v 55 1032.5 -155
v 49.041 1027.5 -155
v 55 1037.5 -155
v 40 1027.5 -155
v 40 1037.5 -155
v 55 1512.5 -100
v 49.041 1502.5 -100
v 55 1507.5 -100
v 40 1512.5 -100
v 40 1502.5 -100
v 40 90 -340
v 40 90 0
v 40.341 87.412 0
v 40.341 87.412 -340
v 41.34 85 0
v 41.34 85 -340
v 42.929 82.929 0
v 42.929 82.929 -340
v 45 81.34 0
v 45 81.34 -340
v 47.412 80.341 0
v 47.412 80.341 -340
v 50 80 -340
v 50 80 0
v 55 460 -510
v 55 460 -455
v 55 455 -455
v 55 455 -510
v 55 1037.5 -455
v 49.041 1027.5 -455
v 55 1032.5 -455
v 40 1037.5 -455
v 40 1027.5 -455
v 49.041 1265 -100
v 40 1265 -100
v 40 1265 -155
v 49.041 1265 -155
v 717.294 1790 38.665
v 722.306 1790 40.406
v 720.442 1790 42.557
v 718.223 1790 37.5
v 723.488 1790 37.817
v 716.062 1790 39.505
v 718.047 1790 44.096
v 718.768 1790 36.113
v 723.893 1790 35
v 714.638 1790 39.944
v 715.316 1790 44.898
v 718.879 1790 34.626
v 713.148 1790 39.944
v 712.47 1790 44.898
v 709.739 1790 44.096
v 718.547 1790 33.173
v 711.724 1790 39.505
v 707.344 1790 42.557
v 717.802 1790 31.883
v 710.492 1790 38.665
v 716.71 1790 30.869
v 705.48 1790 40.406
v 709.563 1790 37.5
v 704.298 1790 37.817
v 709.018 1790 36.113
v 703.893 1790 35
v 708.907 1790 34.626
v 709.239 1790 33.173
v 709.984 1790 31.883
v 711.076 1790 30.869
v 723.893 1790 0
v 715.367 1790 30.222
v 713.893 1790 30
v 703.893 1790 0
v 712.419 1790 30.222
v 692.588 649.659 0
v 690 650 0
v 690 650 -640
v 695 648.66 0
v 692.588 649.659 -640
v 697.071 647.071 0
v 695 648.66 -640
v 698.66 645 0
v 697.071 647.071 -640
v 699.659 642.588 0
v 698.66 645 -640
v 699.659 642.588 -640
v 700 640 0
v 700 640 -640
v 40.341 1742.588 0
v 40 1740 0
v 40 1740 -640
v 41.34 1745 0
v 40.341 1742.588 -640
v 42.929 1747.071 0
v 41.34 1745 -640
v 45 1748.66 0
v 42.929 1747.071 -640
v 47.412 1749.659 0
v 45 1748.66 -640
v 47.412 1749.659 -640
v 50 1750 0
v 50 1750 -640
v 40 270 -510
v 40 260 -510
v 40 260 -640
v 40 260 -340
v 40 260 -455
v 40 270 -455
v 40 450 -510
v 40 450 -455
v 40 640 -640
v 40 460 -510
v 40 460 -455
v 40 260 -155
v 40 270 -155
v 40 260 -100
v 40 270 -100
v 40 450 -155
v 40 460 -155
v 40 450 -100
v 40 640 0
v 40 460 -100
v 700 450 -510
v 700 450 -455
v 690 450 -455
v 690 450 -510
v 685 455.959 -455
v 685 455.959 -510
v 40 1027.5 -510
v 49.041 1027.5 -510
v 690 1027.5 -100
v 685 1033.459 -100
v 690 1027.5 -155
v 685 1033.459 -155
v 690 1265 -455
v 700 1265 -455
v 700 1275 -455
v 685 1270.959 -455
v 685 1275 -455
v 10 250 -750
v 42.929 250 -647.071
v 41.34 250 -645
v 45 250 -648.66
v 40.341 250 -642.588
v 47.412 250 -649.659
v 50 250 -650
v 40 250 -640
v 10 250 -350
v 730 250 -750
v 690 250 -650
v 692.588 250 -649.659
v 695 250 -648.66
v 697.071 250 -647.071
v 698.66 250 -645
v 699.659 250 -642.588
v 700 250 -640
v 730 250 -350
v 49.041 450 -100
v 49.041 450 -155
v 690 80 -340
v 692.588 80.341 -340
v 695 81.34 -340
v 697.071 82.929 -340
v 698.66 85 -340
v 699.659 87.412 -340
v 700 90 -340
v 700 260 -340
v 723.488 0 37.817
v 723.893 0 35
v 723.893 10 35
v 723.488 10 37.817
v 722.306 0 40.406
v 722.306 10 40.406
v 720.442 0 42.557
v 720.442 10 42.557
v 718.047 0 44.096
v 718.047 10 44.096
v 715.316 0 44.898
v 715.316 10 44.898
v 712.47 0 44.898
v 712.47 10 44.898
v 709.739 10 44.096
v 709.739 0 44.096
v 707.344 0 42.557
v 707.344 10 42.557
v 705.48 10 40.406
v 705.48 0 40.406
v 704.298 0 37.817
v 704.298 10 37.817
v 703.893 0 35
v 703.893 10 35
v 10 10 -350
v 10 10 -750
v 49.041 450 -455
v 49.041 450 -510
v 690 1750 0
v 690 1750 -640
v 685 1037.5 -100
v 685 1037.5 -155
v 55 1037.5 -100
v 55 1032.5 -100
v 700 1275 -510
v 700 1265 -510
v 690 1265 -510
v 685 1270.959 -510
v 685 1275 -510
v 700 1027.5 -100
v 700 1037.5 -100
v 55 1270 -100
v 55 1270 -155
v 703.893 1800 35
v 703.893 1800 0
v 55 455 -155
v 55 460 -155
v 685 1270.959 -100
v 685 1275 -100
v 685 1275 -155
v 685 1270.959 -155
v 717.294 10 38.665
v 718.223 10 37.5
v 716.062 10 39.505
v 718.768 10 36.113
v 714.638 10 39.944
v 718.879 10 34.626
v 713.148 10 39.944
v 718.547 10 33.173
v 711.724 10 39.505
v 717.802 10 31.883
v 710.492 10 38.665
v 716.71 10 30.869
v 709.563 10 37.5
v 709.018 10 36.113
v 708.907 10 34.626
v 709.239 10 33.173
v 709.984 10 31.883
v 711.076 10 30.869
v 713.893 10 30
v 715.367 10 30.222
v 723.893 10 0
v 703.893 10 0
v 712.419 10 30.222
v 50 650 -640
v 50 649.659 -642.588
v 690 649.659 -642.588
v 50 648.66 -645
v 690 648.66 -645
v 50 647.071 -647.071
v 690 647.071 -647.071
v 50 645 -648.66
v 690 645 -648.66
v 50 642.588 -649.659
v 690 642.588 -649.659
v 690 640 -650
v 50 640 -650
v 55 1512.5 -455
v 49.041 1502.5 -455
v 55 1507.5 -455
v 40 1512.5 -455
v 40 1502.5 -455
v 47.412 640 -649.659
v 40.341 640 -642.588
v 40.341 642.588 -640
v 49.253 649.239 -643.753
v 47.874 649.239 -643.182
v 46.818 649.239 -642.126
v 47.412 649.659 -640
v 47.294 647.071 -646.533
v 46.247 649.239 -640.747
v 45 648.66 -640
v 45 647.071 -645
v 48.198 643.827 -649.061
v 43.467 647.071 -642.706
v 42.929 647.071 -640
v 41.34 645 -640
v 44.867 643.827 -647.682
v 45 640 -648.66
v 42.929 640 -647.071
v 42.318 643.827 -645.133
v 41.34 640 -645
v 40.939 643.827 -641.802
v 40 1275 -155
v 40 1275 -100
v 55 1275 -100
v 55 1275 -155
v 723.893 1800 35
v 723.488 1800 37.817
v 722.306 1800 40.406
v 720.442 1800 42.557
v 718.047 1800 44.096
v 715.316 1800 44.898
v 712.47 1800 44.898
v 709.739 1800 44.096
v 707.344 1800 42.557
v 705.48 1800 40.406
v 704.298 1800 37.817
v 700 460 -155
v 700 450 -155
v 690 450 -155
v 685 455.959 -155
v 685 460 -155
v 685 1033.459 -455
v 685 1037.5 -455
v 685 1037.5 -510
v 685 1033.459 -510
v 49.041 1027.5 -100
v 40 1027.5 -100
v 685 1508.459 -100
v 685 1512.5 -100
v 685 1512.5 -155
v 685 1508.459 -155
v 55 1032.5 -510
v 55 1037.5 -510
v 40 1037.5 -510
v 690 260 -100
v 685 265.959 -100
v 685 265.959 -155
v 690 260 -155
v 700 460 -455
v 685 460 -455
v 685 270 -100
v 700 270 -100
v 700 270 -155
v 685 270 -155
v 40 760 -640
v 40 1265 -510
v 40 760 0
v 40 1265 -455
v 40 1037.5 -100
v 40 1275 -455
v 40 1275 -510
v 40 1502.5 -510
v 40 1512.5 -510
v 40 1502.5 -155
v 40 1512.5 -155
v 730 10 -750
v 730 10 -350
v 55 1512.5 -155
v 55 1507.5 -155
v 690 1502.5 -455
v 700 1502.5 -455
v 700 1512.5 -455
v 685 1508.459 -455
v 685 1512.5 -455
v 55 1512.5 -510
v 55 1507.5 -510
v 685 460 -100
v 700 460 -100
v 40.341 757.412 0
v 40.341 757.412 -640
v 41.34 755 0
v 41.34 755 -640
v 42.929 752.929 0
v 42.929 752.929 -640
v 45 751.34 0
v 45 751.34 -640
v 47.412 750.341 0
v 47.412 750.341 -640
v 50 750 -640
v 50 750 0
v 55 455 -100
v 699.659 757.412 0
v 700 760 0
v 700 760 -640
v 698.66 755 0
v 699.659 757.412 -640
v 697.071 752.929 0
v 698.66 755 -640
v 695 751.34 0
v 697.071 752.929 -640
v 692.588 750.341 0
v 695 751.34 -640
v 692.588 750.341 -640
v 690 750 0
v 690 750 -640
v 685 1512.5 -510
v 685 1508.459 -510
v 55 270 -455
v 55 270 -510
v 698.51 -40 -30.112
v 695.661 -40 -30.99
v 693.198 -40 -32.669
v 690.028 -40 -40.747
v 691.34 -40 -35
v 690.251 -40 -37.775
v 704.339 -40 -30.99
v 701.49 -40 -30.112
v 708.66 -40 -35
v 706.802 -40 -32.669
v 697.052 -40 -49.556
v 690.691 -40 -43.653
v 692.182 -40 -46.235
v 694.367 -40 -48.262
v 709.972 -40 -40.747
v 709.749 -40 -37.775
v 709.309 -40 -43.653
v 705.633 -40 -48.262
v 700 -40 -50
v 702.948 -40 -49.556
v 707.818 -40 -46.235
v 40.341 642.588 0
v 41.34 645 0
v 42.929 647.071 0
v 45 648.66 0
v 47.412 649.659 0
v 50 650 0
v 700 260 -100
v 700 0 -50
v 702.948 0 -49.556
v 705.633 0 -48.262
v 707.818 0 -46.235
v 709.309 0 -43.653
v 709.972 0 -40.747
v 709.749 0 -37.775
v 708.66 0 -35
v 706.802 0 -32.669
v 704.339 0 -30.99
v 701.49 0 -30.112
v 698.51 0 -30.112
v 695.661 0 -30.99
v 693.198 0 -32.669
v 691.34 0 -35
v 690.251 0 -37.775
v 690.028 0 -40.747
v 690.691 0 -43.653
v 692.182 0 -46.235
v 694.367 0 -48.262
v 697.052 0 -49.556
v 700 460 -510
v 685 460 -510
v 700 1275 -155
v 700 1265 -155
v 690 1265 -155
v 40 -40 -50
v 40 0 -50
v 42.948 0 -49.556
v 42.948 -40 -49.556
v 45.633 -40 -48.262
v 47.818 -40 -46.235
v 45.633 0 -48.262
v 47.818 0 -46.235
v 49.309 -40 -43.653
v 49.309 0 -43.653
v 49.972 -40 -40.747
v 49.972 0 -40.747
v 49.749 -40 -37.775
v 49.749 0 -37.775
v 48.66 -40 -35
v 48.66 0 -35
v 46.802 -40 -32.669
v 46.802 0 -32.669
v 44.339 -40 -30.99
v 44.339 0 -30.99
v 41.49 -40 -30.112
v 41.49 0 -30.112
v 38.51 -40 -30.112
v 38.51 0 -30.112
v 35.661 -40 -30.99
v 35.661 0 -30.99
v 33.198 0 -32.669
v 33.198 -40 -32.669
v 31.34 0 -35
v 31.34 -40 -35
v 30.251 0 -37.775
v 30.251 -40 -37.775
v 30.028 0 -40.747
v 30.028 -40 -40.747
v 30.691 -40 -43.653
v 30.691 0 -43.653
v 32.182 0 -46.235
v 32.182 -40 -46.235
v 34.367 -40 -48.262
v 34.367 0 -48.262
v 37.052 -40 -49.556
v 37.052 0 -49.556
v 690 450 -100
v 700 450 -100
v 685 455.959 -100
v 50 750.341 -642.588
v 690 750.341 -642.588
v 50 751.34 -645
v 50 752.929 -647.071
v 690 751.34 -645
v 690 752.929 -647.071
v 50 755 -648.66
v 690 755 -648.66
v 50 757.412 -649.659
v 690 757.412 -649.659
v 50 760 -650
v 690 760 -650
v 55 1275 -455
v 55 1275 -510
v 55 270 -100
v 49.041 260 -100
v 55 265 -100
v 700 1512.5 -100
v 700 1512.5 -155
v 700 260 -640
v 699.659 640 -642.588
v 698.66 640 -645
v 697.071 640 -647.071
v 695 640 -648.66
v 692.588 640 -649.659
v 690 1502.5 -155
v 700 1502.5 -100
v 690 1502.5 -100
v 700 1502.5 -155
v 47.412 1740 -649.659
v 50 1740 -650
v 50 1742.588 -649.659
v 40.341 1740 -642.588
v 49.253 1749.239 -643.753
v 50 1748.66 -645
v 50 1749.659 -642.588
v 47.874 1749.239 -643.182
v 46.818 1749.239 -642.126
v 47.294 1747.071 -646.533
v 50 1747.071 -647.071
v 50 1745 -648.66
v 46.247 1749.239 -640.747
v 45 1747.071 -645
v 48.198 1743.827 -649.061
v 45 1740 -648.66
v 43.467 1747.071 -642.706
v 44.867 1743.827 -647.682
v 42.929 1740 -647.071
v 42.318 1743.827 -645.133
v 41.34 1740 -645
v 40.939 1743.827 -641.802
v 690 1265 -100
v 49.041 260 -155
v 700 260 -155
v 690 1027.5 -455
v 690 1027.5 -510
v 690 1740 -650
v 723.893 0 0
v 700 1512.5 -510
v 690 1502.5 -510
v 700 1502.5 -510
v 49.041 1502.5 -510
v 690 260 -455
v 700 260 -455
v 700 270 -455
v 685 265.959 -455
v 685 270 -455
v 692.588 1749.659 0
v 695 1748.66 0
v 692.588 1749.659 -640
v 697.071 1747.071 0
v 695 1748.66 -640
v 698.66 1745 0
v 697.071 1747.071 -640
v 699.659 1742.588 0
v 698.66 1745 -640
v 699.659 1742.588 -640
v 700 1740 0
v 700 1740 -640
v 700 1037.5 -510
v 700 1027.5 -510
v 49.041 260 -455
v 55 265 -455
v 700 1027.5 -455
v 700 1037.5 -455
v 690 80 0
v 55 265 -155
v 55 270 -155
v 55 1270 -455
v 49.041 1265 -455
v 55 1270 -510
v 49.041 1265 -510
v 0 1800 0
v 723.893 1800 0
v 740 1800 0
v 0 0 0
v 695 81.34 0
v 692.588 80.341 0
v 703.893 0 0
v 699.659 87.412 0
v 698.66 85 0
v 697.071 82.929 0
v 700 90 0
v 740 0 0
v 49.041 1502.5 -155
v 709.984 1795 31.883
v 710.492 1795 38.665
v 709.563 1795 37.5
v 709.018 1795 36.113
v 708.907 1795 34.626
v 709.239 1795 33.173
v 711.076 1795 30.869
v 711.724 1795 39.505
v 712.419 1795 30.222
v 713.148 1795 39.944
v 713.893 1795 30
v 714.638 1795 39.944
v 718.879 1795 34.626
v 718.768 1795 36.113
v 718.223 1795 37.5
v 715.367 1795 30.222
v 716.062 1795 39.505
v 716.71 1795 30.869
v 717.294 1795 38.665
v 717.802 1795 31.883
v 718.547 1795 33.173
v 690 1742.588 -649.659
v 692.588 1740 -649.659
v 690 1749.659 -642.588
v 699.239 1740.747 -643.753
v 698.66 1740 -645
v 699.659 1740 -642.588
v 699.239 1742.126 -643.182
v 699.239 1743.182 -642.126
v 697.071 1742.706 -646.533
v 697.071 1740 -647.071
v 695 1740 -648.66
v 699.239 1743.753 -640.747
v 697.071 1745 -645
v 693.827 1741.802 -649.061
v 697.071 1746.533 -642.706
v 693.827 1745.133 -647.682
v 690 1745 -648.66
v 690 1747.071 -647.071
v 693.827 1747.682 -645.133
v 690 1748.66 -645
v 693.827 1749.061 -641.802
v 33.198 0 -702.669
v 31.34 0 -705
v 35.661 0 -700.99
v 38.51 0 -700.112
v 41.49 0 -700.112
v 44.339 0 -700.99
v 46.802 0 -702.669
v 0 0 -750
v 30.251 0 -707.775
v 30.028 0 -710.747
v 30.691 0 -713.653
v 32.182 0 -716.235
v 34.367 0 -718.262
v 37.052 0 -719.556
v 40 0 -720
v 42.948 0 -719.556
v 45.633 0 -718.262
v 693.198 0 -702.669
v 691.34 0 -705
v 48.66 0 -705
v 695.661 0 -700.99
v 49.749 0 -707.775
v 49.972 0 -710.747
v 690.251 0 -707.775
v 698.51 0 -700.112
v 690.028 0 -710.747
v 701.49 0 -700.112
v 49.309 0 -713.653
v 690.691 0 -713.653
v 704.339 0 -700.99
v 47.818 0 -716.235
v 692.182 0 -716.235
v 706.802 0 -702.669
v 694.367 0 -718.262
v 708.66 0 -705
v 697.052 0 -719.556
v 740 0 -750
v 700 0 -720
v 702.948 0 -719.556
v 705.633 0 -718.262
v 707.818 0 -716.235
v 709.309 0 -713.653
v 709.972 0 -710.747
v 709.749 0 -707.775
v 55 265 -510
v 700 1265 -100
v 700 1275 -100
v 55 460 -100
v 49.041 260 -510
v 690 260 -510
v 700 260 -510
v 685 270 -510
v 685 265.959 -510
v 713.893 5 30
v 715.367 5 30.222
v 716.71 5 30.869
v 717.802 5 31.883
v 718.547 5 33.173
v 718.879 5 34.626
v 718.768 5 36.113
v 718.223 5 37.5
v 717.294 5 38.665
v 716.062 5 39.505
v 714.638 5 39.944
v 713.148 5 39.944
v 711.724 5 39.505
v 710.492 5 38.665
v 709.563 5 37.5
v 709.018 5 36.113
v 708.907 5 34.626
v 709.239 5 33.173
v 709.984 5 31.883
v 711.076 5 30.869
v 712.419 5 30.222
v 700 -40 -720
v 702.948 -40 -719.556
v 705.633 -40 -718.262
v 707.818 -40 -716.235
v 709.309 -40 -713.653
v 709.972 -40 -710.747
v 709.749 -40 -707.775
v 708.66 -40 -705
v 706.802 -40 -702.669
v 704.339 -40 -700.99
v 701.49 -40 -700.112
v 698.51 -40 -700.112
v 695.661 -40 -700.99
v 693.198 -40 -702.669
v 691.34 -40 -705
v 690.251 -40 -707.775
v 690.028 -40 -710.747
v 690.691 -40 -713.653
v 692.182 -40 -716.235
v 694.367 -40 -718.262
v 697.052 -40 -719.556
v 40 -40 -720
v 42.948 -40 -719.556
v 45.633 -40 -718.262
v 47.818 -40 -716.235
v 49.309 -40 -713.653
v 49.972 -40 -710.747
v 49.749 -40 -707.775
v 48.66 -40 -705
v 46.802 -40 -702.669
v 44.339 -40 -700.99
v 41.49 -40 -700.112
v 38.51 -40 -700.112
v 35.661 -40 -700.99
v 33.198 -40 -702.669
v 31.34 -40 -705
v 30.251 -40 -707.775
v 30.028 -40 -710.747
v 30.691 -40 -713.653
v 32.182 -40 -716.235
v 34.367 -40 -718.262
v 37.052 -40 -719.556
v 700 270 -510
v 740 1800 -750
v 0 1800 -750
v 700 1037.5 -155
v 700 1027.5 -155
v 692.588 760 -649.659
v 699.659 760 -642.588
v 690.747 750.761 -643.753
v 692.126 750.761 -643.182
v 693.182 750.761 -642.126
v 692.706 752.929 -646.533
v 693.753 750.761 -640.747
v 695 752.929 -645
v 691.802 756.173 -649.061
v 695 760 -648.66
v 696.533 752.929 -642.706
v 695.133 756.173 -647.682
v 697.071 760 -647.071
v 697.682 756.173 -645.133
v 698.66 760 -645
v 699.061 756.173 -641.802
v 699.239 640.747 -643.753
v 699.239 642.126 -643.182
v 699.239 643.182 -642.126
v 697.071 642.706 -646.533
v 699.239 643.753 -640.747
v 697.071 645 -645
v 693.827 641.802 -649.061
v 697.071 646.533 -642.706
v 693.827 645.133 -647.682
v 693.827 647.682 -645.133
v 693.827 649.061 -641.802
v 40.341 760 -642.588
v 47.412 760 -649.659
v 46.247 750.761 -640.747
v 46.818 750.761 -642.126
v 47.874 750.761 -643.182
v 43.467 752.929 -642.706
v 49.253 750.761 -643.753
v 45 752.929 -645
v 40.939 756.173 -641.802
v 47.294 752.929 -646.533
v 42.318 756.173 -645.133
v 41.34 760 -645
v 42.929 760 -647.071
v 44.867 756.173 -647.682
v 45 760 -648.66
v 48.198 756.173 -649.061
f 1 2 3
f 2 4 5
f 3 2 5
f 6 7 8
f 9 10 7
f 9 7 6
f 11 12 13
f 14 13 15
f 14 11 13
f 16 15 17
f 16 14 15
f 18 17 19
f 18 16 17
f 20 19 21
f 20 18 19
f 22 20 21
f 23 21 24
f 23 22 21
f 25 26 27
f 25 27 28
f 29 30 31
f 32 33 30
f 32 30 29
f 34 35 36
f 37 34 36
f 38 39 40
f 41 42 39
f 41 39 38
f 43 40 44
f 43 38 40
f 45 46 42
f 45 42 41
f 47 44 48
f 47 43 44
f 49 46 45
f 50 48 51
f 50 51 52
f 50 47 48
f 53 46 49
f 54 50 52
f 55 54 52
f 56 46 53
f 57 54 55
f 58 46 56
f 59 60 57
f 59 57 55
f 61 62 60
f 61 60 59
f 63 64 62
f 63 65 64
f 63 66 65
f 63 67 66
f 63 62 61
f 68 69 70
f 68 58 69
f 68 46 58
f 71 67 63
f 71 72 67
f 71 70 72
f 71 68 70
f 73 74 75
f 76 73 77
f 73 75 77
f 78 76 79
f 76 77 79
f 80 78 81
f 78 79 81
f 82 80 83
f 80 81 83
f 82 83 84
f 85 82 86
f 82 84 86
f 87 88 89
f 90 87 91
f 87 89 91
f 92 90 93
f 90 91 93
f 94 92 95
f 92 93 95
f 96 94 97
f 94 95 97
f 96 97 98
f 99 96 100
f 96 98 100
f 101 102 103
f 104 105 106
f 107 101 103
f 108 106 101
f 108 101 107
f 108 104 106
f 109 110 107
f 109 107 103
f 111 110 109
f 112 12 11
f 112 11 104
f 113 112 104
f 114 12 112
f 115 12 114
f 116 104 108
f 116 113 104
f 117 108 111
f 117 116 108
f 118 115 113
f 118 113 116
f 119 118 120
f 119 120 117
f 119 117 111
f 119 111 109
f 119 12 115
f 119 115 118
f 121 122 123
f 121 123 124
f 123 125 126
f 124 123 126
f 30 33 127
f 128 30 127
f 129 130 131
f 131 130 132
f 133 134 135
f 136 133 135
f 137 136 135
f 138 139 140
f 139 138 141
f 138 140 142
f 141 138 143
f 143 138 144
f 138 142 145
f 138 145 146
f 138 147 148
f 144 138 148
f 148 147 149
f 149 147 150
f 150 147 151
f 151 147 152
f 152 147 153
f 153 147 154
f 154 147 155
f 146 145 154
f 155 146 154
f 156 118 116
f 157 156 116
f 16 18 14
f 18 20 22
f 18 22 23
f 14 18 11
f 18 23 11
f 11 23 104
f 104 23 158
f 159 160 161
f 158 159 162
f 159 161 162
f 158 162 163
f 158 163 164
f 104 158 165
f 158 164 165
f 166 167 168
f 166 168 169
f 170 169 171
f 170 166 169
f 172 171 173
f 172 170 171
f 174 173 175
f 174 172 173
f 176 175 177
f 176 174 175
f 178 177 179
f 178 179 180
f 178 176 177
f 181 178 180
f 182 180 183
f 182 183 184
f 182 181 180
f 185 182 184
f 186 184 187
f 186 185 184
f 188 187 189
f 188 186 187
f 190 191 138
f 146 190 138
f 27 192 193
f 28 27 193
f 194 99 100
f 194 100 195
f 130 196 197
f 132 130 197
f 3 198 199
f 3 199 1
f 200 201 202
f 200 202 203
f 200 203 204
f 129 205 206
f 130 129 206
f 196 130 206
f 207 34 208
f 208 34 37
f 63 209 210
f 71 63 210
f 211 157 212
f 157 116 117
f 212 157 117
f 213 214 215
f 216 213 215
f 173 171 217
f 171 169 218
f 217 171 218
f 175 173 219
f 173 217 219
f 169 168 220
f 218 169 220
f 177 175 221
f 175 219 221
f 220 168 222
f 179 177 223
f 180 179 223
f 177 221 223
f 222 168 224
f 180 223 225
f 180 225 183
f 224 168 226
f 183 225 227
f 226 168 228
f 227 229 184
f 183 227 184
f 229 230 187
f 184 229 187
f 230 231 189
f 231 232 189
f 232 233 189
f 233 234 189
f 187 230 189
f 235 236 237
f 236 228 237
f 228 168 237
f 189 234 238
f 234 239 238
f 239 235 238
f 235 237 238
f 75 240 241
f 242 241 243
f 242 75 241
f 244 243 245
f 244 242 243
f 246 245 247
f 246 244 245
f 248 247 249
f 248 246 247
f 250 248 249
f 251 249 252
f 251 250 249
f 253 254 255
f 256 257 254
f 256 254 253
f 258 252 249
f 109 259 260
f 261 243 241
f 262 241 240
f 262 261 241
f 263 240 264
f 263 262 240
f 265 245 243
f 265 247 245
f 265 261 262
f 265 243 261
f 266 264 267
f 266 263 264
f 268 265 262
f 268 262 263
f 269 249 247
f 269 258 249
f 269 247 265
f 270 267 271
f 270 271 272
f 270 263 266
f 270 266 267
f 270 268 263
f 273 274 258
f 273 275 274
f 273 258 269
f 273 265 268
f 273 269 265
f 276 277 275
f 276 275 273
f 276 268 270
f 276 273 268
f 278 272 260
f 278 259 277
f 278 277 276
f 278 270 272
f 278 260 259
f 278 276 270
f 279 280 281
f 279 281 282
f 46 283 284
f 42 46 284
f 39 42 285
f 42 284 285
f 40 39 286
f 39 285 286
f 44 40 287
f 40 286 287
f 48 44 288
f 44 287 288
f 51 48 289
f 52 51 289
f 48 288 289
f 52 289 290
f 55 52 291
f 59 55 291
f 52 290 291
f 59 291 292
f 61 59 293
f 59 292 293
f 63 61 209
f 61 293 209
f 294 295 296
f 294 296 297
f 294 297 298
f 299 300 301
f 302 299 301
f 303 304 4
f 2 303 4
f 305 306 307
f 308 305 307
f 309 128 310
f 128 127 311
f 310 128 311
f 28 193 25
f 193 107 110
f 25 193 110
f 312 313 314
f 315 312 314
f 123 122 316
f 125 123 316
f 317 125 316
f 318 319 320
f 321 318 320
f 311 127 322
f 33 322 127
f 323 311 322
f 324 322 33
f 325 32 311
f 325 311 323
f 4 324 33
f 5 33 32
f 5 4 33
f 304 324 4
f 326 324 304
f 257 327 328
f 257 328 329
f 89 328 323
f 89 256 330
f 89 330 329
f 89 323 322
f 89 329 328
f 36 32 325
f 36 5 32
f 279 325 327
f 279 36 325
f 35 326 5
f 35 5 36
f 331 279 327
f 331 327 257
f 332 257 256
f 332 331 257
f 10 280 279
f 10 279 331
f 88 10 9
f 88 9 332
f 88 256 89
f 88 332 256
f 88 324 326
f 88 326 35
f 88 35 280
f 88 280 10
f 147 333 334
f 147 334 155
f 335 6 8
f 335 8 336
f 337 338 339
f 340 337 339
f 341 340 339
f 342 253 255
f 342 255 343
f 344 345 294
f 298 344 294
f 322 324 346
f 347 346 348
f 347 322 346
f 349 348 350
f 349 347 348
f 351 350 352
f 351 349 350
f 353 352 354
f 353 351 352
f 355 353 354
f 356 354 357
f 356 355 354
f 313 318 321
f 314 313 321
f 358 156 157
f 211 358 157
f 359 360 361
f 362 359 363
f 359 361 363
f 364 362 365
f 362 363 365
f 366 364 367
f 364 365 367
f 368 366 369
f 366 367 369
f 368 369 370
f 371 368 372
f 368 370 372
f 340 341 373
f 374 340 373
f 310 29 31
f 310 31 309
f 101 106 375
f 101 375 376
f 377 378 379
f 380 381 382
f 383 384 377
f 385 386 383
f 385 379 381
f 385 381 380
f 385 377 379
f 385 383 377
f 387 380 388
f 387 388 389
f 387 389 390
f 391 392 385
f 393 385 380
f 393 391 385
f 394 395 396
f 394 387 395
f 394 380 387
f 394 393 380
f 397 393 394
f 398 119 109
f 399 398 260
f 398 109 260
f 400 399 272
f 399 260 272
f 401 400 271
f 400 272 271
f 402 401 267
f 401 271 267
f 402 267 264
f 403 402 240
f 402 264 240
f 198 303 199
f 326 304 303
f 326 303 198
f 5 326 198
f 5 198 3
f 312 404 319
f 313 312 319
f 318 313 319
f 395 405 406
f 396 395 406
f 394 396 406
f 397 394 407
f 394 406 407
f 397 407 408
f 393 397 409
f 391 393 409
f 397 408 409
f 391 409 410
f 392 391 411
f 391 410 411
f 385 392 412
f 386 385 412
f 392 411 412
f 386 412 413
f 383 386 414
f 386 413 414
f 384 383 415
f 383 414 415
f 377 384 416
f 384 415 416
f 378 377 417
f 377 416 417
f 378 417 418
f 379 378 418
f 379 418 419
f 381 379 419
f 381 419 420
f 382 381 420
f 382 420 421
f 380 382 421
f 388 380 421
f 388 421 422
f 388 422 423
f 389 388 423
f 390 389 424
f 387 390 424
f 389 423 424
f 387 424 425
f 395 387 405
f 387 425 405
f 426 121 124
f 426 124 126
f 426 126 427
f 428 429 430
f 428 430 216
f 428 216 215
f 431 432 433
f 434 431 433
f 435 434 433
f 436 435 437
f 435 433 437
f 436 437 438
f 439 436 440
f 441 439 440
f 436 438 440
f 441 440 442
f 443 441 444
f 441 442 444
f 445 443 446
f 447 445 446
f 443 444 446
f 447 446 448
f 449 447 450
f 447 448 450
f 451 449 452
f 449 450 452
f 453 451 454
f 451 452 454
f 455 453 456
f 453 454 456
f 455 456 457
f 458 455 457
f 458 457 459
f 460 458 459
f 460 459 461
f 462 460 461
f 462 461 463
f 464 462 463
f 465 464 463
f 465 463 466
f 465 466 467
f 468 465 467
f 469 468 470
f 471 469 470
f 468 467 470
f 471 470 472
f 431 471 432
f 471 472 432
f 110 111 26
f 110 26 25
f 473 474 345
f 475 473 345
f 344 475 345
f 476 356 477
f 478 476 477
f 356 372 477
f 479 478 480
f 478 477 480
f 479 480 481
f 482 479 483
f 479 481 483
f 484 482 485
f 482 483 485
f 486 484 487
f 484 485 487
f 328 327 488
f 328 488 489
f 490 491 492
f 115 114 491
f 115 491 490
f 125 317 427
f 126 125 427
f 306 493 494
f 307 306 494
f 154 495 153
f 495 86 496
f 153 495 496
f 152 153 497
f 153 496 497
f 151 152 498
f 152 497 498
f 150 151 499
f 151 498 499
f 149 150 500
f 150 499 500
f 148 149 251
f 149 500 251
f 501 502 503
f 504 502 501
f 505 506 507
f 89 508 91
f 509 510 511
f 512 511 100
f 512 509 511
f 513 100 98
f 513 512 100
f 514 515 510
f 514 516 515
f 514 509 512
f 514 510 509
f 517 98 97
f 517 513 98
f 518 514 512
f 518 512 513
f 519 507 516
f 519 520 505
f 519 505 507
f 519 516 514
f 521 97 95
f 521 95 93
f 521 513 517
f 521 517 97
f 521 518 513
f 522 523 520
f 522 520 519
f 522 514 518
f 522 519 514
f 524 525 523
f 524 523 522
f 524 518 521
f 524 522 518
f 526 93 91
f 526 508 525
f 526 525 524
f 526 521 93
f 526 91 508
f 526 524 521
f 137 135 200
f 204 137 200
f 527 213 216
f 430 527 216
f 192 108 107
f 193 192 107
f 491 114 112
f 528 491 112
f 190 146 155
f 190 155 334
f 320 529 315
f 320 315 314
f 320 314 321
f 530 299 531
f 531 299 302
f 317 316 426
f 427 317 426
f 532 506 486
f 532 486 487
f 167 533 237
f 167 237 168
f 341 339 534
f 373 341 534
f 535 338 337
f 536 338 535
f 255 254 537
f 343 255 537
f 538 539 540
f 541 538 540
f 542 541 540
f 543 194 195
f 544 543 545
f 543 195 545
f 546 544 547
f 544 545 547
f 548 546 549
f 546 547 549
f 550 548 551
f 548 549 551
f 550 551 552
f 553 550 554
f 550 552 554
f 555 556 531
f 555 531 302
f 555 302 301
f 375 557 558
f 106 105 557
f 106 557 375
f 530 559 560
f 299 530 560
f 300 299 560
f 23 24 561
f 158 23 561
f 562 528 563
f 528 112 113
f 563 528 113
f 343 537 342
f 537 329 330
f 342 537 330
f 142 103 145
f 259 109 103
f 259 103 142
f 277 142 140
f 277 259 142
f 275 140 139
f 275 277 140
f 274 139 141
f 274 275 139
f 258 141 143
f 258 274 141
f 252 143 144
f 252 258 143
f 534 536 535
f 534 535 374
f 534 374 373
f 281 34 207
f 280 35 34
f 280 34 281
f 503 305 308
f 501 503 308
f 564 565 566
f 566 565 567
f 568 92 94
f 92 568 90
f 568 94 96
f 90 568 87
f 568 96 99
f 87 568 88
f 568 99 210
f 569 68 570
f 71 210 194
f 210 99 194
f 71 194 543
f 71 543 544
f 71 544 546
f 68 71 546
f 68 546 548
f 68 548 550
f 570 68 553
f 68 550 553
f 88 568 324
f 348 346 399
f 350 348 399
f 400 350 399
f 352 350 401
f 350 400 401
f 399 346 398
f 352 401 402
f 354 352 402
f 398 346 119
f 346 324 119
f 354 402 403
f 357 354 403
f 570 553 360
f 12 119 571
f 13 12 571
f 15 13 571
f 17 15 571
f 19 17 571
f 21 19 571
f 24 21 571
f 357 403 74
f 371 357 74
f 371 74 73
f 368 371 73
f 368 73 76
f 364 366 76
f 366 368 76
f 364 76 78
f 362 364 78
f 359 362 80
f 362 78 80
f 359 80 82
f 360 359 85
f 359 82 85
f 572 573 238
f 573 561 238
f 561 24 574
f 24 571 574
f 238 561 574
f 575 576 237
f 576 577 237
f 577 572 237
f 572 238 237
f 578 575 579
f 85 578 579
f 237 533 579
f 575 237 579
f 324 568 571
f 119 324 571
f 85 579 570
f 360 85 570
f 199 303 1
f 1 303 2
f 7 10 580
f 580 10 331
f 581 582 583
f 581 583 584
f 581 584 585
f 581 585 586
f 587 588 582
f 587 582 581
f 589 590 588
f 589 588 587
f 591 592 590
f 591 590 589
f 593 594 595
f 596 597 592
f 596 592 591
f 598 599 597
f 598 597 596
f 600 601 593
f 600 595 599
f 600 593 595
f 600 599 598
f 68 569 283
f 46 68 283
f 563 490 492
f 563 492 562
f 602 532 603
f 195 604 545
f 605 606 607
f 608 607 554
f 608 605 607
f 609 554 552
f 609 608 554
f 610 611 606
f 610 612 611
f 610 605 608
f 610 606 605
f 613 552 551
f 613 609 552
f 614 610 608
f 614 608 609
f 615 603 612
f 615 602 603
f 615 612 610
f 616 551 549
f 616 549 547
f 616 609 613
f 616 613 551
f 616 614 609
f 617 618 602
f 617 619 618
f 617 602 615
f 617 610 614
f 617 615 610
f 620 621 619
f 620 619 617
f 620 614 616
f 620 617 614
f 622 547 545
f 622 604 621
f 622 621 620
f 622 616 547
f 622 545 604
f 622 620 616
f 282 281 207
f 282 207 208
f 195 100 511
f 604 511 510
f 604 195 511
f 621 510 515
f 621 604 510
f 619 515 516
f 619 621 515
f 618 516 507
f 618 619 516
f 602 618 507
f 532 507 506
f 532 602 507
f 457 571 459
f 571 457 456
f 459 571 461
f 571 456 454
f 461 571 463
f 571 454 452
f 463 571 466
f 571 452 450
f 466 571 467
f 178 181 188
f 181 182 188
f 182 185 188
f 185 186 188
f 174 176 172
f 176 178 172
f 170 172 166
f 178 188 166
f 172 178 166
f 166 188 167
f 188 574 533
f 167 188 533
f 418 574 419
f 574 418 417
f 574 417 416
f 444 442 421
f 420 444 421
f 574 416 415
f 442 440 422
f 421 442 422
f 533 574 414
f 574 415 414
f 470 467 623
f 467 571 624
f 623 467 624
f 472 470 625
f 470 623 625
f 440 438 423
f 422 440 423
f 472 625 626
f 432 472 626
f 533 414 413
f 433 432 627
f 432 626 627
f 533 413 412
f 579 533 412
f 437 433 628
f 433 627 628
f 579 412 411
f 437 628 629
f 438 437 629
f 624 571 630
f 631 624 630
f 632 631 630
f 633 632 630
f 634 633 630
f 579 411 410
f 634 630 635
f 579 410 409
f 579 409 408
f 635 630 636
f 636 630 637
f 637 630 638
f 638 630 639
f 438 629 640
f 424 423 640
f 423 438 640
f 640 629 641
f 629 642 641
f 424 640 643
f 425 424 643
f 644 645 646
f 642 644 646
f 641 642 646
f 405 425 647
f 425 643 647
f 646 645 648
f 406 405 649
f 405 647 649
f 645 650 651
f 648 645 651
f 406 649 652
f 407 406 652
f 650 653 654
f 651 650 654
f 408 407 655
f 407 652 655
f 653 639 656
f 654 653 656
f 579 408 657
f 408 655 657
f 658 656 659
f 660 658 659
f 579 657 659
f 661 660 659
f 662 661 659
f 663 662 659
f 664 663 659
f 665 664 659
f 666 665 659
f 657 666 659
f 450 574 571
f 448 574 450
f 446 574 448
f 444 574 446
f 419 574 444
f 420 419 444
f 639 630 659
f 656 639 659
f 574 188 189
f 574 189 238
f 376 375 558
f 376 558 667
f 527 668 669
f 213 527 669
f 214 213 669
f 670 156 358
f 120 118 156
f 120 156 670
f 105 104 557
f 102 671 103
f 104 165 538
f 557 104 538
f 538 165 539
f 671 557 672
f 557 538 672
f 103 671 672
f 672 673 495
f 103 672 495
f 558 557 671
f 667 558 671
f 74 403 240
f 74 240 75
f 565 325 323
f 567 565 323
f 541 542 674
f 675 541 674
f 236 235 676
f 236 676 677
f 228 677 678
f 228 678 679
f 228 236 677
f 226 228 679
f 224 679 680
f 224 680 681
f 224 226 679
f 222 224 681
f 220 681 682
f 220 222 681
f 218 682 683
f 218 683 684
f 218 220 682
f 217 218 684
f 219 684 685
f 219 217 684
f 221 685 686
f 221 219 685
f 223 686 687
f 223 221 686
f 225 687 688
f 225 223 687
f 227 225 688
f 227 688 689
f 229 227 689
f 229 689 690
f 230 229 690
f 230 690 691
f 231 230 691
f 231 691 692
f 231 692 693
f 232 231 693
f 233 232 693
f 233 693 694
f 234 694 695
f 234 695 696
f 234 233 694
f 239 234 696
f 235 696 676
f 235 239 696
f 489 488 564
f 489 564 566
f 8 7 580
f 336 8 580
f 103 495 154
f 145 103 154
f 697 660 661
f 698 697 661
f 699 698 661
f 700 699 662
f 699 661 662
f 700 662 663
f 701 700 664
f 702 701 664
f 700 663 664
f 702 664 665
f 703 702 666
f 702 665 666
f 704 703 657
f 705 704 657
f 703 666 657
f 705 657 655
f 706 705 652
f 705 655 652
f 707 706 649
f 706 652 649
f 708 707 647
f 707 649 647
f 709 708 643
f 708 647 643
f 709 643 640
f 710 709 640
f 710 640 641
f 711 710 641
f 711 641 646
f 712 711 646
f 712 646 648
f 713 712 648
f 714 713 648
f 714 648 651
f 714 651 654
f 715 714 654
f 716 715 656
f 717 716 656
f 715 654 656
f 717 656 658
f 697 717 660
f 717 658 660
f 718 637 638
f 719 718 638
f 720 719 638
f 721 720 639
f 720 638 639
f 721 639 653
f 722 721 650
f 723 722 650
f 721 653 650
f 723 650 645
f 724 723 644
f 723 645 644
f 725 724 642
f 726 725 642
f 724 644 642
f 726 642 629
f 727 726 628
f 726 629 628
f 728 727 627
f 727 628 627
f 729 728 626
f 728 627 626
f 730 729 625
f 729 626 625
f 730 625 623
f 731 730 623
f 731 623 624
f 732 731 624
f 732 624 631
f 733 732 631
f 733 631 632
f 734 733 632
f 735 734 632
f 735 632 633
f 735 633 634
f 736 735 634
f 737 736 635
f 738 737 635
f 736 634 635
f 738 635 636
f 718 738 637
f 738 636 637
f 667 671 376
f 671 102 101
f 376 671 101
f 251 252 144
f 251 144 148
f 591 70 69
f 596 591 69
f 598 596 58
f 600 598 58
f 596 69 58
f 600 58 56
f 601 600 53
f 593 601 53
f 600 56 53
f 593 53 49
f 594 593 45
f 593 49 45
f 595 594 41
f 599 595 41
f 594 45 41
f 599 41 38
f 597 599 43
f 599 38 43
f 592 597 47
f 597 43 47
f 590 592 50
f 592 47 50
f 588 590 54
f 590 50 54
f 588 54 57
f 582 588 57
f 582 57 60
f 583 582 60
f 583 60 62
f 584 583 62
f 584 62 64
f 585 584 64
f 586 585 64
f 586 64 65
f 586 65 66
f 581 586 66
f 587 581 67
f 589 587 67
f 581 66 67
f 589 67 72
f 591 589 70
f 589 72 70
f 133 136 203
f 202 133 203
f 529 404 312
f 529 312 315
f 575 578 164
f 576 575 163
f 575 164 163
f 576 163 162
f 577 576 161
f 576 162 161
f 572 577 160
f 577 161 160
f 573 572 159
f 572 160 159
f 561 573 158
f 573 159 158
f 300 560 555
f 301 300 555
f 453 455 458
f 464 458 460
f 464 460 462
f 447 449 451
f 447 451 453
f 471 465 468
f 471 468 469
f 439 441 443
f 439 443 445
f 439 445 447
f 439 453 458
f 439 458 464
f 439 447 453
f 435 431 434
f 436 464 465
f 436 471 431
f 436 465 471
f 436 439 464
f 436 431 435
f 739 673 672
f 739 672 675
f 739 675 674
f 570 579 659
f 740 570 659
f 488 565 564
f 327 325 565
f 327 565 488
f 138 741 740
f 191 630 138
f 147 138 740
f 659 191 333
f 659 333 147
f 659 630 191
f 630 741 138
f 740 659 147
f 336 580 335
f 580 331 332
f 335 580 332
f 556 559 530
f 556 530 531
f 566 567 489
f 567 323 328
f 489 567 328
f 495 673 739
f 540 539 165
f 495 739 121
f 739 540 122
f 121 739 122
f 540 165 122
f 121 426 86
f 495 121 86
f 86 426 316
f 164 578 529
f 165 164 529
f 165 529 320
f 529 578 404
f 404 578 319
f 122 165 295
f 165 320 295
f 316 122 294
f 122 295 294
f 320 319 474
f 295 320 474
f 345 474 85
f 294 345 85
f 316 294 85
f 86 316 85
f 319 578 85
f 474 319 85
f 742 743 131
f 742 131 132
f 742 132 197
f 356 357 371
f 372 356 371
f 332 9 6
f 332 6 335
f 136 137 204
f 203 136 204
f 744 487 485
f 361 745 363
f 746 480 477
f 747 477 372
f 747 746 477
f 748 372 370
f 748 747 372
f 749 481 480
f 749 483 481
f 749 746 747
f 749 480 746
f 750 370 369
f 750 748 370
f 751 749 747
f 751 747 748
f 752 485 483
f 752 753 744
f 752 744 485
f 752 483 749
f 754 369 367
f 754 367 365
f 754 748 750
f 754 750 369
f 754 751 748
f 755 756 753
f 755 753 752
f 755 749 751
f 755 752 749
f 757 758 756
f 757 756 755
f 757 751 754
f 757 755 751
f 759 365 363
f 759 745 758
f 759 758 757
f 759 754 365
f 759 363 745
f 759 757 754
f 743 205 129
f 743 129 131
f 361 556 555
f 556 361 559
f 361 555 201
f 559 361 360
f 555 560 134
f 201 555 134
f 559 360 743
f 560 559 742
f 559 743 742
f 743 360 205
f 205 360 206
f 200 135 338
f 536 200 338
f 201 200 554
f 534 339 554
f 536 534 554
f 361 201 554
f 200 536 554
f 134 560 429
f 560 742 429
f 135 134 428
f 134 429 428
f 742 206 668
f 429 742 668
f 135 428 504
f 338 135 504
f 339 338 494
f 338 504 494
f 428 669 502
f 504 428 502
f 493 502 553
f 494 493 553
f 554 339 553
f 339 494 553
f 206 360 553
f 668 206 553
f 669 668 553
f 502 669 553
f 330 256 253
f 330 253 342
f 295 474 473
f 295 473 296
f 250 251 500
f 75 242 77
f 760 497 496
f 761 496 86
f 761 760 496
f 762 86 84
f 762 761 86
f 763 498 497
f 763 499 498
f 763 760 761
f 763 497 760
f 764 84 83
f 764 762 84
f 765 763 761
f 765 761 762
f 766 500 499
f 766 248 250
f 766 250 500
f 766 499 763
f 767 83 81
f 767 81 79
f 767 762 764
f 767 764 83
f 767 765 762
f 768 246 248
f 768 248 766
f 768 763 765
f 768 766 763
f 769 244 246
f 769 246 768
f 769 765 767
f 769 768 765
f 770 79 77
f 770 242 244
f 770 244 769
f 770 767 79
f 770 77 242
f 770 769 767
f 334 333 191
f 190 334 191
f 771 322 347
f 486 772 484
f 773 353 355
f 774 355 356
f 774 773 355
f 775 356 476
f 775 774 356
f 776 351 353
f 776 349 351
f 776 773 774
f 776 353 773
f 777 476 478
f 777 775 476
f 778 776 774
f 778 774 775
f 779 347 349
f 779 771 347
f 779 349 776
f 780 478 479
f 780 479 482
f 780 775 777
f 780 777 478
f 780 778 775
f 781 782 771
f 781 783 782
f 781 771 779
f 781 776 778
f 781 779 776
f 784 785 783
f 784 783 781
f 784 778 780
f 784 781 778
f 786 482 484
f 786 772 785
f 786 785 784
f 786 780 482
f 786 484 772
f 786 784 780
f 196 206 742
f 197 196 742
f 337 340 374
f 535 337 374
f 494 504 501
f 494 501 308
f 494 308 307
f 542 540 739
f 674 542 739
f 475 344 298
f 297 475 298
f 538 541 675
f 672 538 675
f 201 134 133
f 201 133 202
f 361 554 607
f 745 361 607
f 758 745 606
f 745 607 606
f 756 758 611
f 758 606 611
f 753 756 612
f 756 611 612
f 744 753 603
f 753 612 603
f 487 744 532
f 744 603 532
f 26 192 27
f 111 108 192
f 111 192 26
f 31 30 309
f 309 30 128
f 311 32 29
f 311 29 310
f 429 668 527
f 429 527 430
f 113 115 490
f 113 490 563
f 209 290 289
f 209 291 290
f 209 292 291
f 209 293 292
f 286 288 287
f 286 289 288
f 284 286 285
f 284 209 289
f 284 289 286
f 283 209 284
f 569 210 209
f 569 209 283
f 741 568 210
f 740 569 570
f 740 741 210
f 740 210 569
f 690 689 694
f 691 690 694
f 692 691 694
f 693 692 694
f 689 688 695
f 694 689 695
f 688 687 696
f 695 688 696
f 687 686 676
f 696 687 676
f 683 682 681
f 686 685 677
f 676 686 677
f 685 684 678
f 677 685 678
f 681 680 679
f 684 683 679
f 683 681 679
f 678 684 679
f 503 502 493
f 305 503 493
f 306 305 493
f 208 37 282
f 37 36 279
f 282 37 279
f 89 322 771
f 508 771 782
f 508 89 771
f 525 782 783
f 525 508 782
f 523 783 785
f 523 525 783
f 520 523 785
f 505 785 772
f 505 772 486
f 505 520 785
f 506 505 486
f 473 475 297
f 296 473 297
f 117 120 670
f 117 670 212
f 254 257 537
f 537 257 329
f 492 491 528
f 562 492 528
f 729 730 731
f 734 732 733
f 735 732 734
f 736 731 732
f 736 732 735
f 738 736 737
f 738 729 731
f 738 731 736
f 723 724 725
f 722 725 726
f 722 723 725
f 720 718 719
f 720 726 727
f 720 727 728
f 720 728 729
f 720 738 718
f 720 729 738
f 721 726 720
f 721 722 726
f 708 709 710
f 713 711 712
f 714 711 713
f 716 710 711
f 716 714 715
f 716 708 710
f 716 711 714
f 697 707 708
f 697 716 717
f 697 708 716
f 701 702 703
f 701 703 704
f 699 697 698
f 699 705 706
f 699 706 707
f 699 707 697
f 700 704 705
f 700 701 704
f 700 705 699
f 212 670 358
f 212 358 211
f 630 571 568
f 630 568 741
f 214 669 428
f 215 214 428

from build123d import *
from OCP.BRepFilletAPI import BRepFilletAPI_MakeChamfer

# Parameters (mm, degrees)
ESBO_O1_W                = 740
ESBO_O1_H                = 750
RESSALTO_EXTRUS_O1_DEPTH = 1800
ESBO_O5_W                = 660
ESBO_O5_H                = 1000
ESBO_O5_H_2              = 570
CORTE_EXTRUS_O1_DEPTH    = 650
FILETE1_R                = 10
ESBO_O7_R                = 10
RESSALTO_EXTRUS_O3_DEPTH = 40
ESBO_O10_W               = 55
ESBO_O10_H               = 10
RESSALTO_EXTRUS_O4_DEPTH = 15
ESBO_O14_W               = 55
ESBO_O14_H               = 10
RESSALTO_EXTRUS_O5_DEPTH = 15
CHANFRO1_SIZE            = 5
CHANFRO1_SIZE2           = 5.958767963
RESSALTO_EXTRUS_O6_DEPTH = 10
ESBO_O18_R               = 5
CORTE_EXTRUS_O2_DEPTH    = 5
ESBO_O19_W               = 720
ESBO_O19_H               = 240
CORTE_EXTRUS_O5_DEPTH    = 400
RESSALTO_EXTRUS_O8_REACH = 2073.835


with BuildPart() as part:
    # Esboço1 → Ressalto-extrusão1 (new body)
    with BuildSketch(Plane(origin=(0, 0, 0), x_dir=(1, 0, 0), z_dir=(0, 1, 0))):
        with Locations((370, 375)):
            Rectangle(ESBO_O1_W, ESBO_O1_H)
    extrude(amount=RESSALTO_EXTRUS_O1_DEPTH)

    # Esboço5 → Corte-extrusão1 (cut)
    with BuildSketch(Plane.XY):
        with Locations((370, 1250)):
            Rectangle(ESBO_O5_W, ESBO_O5_H)
        with Locations((370, 365)):
            Rectangle(ESBO_O5_W, ESBO_O5_H_2)
    extrude(amount=-CORTE_EXTRUS_O1_DEPTH, mode=Mode.SUBTRACT)

    # Filete1
    filete1_edges = [part.edges().sort_by_distance(p)[0] for p in [
        (40, 1250, -650),
        (40, 750, -325),
        (370, 1750, -650),
        (40, 1750, -325),
        (700, 1250, -650),
        (700, 1750, -325),
        (370, 750, -650),
        (700, 750, -325),
        (40, 365, -650),
        (40, 80, -325),
        (370, 650, -650),
        (40, 650, -325),
        (700, 365, -650),
        (700, 650, -325),
        (370, 80, -650),
        (700, 80, -325),
    ]]
    fillet(filete1_edges, radius=FILETE1_R)

    # Esboço7 → Ressalto-extrusão3 (add)
    with BuildSketch(Plane.XZ):
        with Locations(Location((40, -40, 0), (0, 0, 270))):
            Circle(ESBO_O7_R)
        with Locations(Location((700, -40, 0), (0, 0, 270))):
            Circle(ESBO_O7_R)
        with Locations(Location((700, -710, 0), (0, 0, 270))):
            Circle(ESBO_O7_R)
        with Locations(Location((40, -710, 0), (0, 0, 270))):
            Circle(ESBO_O7_R)
    extrude(amount=RESSALTO_EXTRUS_O3_DEPTH)

    # Esboço10 → Ressalto-extrusão4 (add)
    with BuildSketch(Plane(origin=(40, 0, 0), x_dir=(0, 0, -1), z_dir=(1, 0, 0))):
        with Locations((127.5, 1507.5)):
            Rectangle(ESBO_O10_W, ESBO_O10_H)
        with Locations((482.5, 1507.5)):
            Rectangle(ESBO_O10_W, ESBO_O10_H)
        with Locations((482.5, 1270)):
            Rectangle(ESBO_O10_W, ESBO_O10_H)
        with Locations((482.5, 1032.5)):
            Rectangle(ESBO_O10_W, ESBO_O10_H)
        with Locations((127.5, 1270)):
            Rectangle(ESBO_O10_W, ESBO_O10_H)
        with Locations((127.5, 1032.5)):
            Rectangle(ESBO_O10_W, ESBO_O10_H)
    ressalto_extrus_o4 = extrude(amount=RESSALTO_EXTRUS_O4_DEPTH)

    # Espelhar4: Ressalto-extrusão4 across plane
    add(ressalto_extrus_o4.mirror(Plane(origin=(370, 0, 0), x_dir=(0, 0, 1), z_dir=(1, 0, 0))))

    # Esboço14 → Ressalto-extrusão5 (add)
    with BuildSketch(Plane(origin=(40, 0, 0), x_dir=(0, 0, -1), z_dir=(1, 0, 0))):
        with Locations((127.5, 455)):
            Rectangle(ESBO_O14_W, ESBO_O14_H)
        with Locations((482.5, 455)):
            Rectangle(ESBO_O14_W, ESBO_O14_H)
        with Locations((482.5, 265)):
            Rectangle(ESBO_O14_W, ESBO_O14_H)
        with Locations((127.5, 265)):
            Rectangle(ESBO_O14_W, ESBO_O14_H)
    ressalto_extrus_o5 = extrude(amount=RESSALTO_EXTRUS_O5_DEPTH)

    # Espelhar5: Ressalto-extrusão5 across plane
    add(ressalto_extrus_o5.mirror(Plane(origin=(370, 0, 0), x_dir=(0, 0, 1), z_dir=(1, 0, 0))))

    # Chanfro1: one chamfer whose edges measure the first distance from different faces: ONE call of the kernel's chamfer builder (chamfer() names one face for all edges)
    chanfro1_edges_1 = [part.edges().sort_by_distance(p)[0] for p in [
        (55, 1502.5, -127.5),
    ]]
    chanfro1_side_1 = [part.faces().sort_by_distance(p)[0] for p in [
        (55, 1507.5, -127.5),
    ]]
    chanfro1_edges_2 = [part.edges().sort_by_distance(p)[0] for p in [
        (55, 1502.5, -482.5),
    ]]
    chanfro1_side_2 = [part.faces().sort_by_distance(p)[0] for p in [
        (55, 1507.5, -482.5),
    ]]
    chanfro1_edges_3 = [part.edges().sort_by_distance(p)[0] for p in [
        (55, 1265, -482.5),
    ]]
    chanfro1_side_3 = [part.faces().sort_by_distance(p)[0] for p in [
        (55, 1270, -482.5),
    ]]
    chanfro1_edges_4 = [part.edges().sort_by_distance(p)[0] for p in [
        (55, 1027.5, -482.5),
    ]]
    chanfro1_side_4 = [part.faces().sort_by_distance(p)[0] for p in [
        (55, 1032.5, -482.5),
    ]]
    chanfro1_edges_5 = [part.edges().sort_by_distance(p)[0] for p in [
        (55, 1265, -127.5),
    ]]
    chanfro1_side_5 = [part.faces().sort_by_distance(p)[0] for p in [
        (55, 1270, -127.5),
    ]]
    chanfro1_edges_6 = [part.edges().sort_by_distance(p)[0] for p in [
        (55, 1027.5, -127.5),
    ]]
    chanfro1_side_6 = [part.faces().sort_by_distance(p)[0] for p in [
        (55, 1032.5, -127.5),
    ]]
    chanfro1_edges_7 = [part.edges().sort_by_distance(p)[0] for p in [
        (685, 1502.5, -127.5),
    ]]
    chanfro1_side_7 = [part.faces().sort_by_distance(p)[0] for p in [
        (692.5, 1502.5, -127.5),
    ]]
    chanfro1_edges_8 = [part.edges().sort_by_distance(p)[0] for p in [
        (685, 1502.5, -482.5),
    ]]
    chanfro1_side_8 = [part.faces().sort_by_distance(p)[0] for p in [
        (692.5, 1502.5, -482.5),
    ]]
    chanfro1_edges_9 = [part.edges().sort_by_distance(p)[0] for p in [
        (685, 1265, -482.5),
    ]]
    chanfro1_side_9 = [part.faces().sort_by_distance(p)[0] for p in [
        (692.5, 1265, -482.5),
    ]]
    chanfro1_edges_10 = [part.edges().sort_by_distance(p)[0] for p in [
        (685, 1027.5, -482.5),
    ]]
    chanfro1_side_10 = [part.faces().sort_by_distance(p)[0] for p in [
        (692.5, 1027.5, -482.5),
    ]]
    chanfro1_edges_11 = [part.edges().sort_by_distance(p)[0] for p in [
        (685, 1265, -127.5),
    ]]
    chanfro1_side_11 = [part.faces().sort_by_distance(p)[0] for p in [
        (692.5, 1265, -127.5),
    ]]
    chanfro1_edges_12 = [part.edges().sort_by_distance(p)[0] for p in [
        (685, 1027.5, -127.5),
    ]]
    chanfro1_side_12 = [part.faces().sort_by_distance(p)[0] for p in [
        (692.5, 1027.5, -127.5),
    ]]
    chanfro1_edges_13 = [part.edges().sort_by_distance(p)[0] for p in [
        (55, 450, -127.5),
    ]]
    chanfro1_side_13 = [part.faces().sort_by_distance(p)[0] for p in [
        (55, 455, -127.5),
    ]]
    chanfro1_edges_14 = [part.edges().sort_by_distance(p)[0] for p in [
        (55, 450, -482.5),
    ]]
    chanfro1_side_14 = [part.faces().sort_by_distance(p)[0] for p in [
        (55, 455, -482.5),
    ]]
    chanfro1_edges_15 = [part.edges().sort_by_distance(p)[0] for p in [
        (55, 260, -482.5),
    ]]
    chanfro1_side_15 = [part.faces().sort_by_distance(p)[0] for p in [
        (55, 265, -482.5),
    ]]
    chanfro1_edges_16 = [part.edges().sort_by_distance(p)[0] for p in [
        (55, 260, -127.5),
    ]]
    chanfro1_side_16 = [part.faces().sort_by_distance(p)[0] for p in [
        (55, 265, -127.5),
    ]]
    chanfro1_edges_17 = [part.edges().sort_by_distance(p)[0] for p in [
        (685, 450, -127.5),
    ]]
    chanfro1_side_17 = [part.faces().sort_by_distance(p)[0] for p in [
        (692.5, 450, -127.5),
    ]]
    chanfro1_edges_18 = [part.edges().sort_by_distance(p)[0] for p in [
        (685, 450, -482.5),
    ]]
    chanfro1_side_18 = [part.faces().sort_by_distance(p)[0] for p in [
        (692.5, 450, -482.5),
    ]]
    chanfro1_edges_19 = [part.edges().sort_by_distance(p)[0] for p in [
        (685, 260, -482.5),
    ]]
    chanfro1_side_19 = [part.faces().sort_by_distance(p)[0] for p in [
        (692.5, 260, -482.5),
    ]]
    chanfro1_edges_20 = [part.edges().sort_by_distance(p)[0] for p in [
        (685, 260, -127.5),
    ]]
    chanfro1_side_20 = [part.faces().sort_by_distance(p)[0] for p in [
        (692.5, 260, -127.5),
    ]]
    chanfro1 = BRepFilletAPI_MakeChamfer(part.part.solid().wrapped)
    for e in chanfro1_edges_1:
        chanfro1.Add(CHANFRO1_SIZE, CHANFRO1_SIZE2, e.wrapped, chanfro1_side_1[0].wrapped)  # the first distance lies on this face
    for e in chanfro1_edges_2:
        chanfro1.Add(CHANFRO1_SIZE, CHANFRO1_SIZE2, e.wrapped, chanfro1_side_2[0].wrapped)  # the first distance lies on this face
    for e in chanfro1_edges_3:
        chanfro1.Add(CHANFRO1_SIZE, CHANFRO1_SIZE2, e.wrapped, chanfro1_side_3[0].wrapped)  # the first distance lies on this face
    for e in chanfro1_edges_4:
        chanfro1.Add(CHANFRO1_SIZE, CHANFRO1_SIZE2, e.wrapped, chanfro1_side_4[0].wrapped)  # the first distance lies on this face
    for e in chanfro1_edges_5:
        chanfro1.Add(CHANFRO1_SIZE, CHANFRO1_SIZE2, e.wrapped, chanfro1_side_5[0].wrapped)  # the first distance lies on this face
    for e in chanfro1_edges_6:
        chanfro1.Add(CHANFRO1_SIZE, CHANFRO1_SIZE2, e.wrapped, chanfro1_side_6[0].wrapped)  # the first distance lies on this face
    for e in chanfro1_edges_7:
        chanfro1.Add(CHANFRO1_SIZE, CHANFRO1_SIZE2, e.wrapped, chanfro1_side_7[0].wrapped)  # the first distance lies on this face
    for e in chanfro1_edges_8:
        chanfro1.Add(CHANFRO1_SIZE, CHANFRO1_SIZE2, e.wrapped, chanfro1_side_8[0].wrapped)  # the first distance lies on this face
    for e in chanfro1_edges_9:
        chanfro1.Add(CHANFRO1_SIZE, CHANFRO1_SIZE2, e.wrapped, chanfro1_side_9[0].wrapped)  # the first distance lies on this face
    for e in chanfro1_edges_10:
        chanfro1.Add(CHANFRO1_SIZE, CHANFRO1_SIZE2, e.wrapped, chanfro1_side_10[0].wrapped)  # the first distance lies on this face
    for e in chanfro1_edges_11:
        chanfro1.Add(CHANFRO1_SIZE, CHANFRO1_SIZE2, e.wrapped, chanfro1_side_11[0].wrapped)  # the first distance lies on this face
    for e in chanfro1_edges_12:
        chanfro1.Add(CHANFRO1_SIZE, CHANFRO1_SIZE2, e.wrapped, chanfro1_side_12[0].wrapped)  # the first distance lies on this face
    for e in chanfro1_edges_13:
        chanfro1.Add(CHANFRO1_SIZE, CHANFRO1_SIZE2, e.wrapped, chanfro1_side_13[0].wrapped)  # the first distance lies on this face
    for e in chanfro1_edges_14:
        chanfro1.Add(CHANFRO1_SIZE, CHANFRO1_SIZE2, e.wrapped, chanfro1_side_14[0].wrapped)  # the first distance lies on this face
    for e in chanfro1_edges_15:
        chanfro1.Add(CHANFRO1_SIZE, CHANFRO1_SIZE2, e.wrapped, chanfro1_side_15[0].wrapped)  # the first distance lies on this face
    for e in chanfro1_edges_16:
        chanfro1.Add(CHANFRO1_SIZE, CHANFRO1_SIZE2, e.wrapped, chanfro1_side_16[0].wrapped)  # the first distance lies on this face
    for e in chanfro1_edges_17:
        chanfro1.Add(CHANFRO1_SIZE, CHANFRO1_SIZE2, e.wrapped, chanfro1_side_17[0].wrapped)  # the first distance lies on this face
    for e in chanfro1_edges_18:
        chanfro1.Add(CHANFRO1_SIZE, CHANFRO1_SIZE2, e.wrapped, chanfro1_side_18[0].wrapped)  # the first distance lies on this face
    for e in chanfro1_edges_19:
        chanfro1.Add(CHANFRO1_SIZE, CHANFRO1_SIZE2, e.wrapped, chanfro1_side_19[0].wrapped)  # the first distance lies on this face
    for e in chanfro1_edges_20:
        chanfro1.Add(CHANFRO1_SIZE, CHANFRO1_SIZE2, e.wrapped, chanfro1_side_20[0].wrapped)  # the first distance lies on this face
    add(Compound.cast(chanfro1.Shape()), mode=Mode.REPLACE)

    # Esboço17 → Ressalto-extrusão6 (add)
    with BuildSketch(Plane(origin=(0, 1800, 0), x_dir=(1, 0, 0), z_dir=(0, 1, 0))):
        with BuildLine():
            Line((703.893019461, 0), (723.893019461, 0))
            Line((723.893019461, 0), (723.893019461, -35))
            ThreePointArc((723.893019461, -35), (713.893019461, -45), (703.893019461, -35))
            Line((703.893019461, -35), (703.893019461, 0))
        make_face()
    ressalto_extrus_o6 = extrude(amount=-RESSALTO_EXTRUS_O6_DEPTH)

    # Esboço18 → Corte-extrusão2 (cut)
    with BuildSketch(Plane.XZ.offset(-1790)):
        with Locations(Location((713.893019461, 35, 0), (0, 0, 270))):
            Circle(ESBO_O18_R)
    corte_extrus_o2 = extrude(amount=-CORTE_EXTRUS_O2_DEPTH, mode=Mode.SUBTRACT)

    # Espelhar6: Ressalto-extrusão6, Corte-extrusão2 across plane
    add(ressalto_extrus_o6.mirror(Plane.ZX.offset(900)))
    add(corte_extrus_o2.mirror(Plane.ZX.offset(900)), mode=Mode.SUBTRACT)

    # Esboço19 → Corte-extrusão5 (cut)
    with BuildSketch(Plane(origin=(0, 0, -750), x_dir=(-1, 0, 0), z_dir=(0, 0, -1))):
        with Locations((-370, 130)):
            Rectangle(ESBO_O19_W, ESBO_O19_H)
    extrude(amount=-CORTE_EXTRUS_O5_DEPTH, mode=Mode.SUBTRACT)

    # Esboço21 → Ressalto-extrusão8 (add, up to next)
    with BuildSketch(Plane.ZY.offset(-700), mode=Mode.PRIVATE) as ressalto_extrus_o8_sk1:
        Polygon((-640, 250), (-350, 250), (-350, 0), (-340, 0), (-340, 260), (-640, 260), align=None)
    ressalto_extrus_o8_tool1 = extrude(ressalto_extrus_o8_sk1.sketch, amount=RESSALTO_EXTRUS_O8_REACH, mode=Mode.PRIVATE) - part.part
    add(ressalto_extrus_o8_tool1.solids().sort_by_distance((700, 253.969887, -495))[0])


solid = part.part
